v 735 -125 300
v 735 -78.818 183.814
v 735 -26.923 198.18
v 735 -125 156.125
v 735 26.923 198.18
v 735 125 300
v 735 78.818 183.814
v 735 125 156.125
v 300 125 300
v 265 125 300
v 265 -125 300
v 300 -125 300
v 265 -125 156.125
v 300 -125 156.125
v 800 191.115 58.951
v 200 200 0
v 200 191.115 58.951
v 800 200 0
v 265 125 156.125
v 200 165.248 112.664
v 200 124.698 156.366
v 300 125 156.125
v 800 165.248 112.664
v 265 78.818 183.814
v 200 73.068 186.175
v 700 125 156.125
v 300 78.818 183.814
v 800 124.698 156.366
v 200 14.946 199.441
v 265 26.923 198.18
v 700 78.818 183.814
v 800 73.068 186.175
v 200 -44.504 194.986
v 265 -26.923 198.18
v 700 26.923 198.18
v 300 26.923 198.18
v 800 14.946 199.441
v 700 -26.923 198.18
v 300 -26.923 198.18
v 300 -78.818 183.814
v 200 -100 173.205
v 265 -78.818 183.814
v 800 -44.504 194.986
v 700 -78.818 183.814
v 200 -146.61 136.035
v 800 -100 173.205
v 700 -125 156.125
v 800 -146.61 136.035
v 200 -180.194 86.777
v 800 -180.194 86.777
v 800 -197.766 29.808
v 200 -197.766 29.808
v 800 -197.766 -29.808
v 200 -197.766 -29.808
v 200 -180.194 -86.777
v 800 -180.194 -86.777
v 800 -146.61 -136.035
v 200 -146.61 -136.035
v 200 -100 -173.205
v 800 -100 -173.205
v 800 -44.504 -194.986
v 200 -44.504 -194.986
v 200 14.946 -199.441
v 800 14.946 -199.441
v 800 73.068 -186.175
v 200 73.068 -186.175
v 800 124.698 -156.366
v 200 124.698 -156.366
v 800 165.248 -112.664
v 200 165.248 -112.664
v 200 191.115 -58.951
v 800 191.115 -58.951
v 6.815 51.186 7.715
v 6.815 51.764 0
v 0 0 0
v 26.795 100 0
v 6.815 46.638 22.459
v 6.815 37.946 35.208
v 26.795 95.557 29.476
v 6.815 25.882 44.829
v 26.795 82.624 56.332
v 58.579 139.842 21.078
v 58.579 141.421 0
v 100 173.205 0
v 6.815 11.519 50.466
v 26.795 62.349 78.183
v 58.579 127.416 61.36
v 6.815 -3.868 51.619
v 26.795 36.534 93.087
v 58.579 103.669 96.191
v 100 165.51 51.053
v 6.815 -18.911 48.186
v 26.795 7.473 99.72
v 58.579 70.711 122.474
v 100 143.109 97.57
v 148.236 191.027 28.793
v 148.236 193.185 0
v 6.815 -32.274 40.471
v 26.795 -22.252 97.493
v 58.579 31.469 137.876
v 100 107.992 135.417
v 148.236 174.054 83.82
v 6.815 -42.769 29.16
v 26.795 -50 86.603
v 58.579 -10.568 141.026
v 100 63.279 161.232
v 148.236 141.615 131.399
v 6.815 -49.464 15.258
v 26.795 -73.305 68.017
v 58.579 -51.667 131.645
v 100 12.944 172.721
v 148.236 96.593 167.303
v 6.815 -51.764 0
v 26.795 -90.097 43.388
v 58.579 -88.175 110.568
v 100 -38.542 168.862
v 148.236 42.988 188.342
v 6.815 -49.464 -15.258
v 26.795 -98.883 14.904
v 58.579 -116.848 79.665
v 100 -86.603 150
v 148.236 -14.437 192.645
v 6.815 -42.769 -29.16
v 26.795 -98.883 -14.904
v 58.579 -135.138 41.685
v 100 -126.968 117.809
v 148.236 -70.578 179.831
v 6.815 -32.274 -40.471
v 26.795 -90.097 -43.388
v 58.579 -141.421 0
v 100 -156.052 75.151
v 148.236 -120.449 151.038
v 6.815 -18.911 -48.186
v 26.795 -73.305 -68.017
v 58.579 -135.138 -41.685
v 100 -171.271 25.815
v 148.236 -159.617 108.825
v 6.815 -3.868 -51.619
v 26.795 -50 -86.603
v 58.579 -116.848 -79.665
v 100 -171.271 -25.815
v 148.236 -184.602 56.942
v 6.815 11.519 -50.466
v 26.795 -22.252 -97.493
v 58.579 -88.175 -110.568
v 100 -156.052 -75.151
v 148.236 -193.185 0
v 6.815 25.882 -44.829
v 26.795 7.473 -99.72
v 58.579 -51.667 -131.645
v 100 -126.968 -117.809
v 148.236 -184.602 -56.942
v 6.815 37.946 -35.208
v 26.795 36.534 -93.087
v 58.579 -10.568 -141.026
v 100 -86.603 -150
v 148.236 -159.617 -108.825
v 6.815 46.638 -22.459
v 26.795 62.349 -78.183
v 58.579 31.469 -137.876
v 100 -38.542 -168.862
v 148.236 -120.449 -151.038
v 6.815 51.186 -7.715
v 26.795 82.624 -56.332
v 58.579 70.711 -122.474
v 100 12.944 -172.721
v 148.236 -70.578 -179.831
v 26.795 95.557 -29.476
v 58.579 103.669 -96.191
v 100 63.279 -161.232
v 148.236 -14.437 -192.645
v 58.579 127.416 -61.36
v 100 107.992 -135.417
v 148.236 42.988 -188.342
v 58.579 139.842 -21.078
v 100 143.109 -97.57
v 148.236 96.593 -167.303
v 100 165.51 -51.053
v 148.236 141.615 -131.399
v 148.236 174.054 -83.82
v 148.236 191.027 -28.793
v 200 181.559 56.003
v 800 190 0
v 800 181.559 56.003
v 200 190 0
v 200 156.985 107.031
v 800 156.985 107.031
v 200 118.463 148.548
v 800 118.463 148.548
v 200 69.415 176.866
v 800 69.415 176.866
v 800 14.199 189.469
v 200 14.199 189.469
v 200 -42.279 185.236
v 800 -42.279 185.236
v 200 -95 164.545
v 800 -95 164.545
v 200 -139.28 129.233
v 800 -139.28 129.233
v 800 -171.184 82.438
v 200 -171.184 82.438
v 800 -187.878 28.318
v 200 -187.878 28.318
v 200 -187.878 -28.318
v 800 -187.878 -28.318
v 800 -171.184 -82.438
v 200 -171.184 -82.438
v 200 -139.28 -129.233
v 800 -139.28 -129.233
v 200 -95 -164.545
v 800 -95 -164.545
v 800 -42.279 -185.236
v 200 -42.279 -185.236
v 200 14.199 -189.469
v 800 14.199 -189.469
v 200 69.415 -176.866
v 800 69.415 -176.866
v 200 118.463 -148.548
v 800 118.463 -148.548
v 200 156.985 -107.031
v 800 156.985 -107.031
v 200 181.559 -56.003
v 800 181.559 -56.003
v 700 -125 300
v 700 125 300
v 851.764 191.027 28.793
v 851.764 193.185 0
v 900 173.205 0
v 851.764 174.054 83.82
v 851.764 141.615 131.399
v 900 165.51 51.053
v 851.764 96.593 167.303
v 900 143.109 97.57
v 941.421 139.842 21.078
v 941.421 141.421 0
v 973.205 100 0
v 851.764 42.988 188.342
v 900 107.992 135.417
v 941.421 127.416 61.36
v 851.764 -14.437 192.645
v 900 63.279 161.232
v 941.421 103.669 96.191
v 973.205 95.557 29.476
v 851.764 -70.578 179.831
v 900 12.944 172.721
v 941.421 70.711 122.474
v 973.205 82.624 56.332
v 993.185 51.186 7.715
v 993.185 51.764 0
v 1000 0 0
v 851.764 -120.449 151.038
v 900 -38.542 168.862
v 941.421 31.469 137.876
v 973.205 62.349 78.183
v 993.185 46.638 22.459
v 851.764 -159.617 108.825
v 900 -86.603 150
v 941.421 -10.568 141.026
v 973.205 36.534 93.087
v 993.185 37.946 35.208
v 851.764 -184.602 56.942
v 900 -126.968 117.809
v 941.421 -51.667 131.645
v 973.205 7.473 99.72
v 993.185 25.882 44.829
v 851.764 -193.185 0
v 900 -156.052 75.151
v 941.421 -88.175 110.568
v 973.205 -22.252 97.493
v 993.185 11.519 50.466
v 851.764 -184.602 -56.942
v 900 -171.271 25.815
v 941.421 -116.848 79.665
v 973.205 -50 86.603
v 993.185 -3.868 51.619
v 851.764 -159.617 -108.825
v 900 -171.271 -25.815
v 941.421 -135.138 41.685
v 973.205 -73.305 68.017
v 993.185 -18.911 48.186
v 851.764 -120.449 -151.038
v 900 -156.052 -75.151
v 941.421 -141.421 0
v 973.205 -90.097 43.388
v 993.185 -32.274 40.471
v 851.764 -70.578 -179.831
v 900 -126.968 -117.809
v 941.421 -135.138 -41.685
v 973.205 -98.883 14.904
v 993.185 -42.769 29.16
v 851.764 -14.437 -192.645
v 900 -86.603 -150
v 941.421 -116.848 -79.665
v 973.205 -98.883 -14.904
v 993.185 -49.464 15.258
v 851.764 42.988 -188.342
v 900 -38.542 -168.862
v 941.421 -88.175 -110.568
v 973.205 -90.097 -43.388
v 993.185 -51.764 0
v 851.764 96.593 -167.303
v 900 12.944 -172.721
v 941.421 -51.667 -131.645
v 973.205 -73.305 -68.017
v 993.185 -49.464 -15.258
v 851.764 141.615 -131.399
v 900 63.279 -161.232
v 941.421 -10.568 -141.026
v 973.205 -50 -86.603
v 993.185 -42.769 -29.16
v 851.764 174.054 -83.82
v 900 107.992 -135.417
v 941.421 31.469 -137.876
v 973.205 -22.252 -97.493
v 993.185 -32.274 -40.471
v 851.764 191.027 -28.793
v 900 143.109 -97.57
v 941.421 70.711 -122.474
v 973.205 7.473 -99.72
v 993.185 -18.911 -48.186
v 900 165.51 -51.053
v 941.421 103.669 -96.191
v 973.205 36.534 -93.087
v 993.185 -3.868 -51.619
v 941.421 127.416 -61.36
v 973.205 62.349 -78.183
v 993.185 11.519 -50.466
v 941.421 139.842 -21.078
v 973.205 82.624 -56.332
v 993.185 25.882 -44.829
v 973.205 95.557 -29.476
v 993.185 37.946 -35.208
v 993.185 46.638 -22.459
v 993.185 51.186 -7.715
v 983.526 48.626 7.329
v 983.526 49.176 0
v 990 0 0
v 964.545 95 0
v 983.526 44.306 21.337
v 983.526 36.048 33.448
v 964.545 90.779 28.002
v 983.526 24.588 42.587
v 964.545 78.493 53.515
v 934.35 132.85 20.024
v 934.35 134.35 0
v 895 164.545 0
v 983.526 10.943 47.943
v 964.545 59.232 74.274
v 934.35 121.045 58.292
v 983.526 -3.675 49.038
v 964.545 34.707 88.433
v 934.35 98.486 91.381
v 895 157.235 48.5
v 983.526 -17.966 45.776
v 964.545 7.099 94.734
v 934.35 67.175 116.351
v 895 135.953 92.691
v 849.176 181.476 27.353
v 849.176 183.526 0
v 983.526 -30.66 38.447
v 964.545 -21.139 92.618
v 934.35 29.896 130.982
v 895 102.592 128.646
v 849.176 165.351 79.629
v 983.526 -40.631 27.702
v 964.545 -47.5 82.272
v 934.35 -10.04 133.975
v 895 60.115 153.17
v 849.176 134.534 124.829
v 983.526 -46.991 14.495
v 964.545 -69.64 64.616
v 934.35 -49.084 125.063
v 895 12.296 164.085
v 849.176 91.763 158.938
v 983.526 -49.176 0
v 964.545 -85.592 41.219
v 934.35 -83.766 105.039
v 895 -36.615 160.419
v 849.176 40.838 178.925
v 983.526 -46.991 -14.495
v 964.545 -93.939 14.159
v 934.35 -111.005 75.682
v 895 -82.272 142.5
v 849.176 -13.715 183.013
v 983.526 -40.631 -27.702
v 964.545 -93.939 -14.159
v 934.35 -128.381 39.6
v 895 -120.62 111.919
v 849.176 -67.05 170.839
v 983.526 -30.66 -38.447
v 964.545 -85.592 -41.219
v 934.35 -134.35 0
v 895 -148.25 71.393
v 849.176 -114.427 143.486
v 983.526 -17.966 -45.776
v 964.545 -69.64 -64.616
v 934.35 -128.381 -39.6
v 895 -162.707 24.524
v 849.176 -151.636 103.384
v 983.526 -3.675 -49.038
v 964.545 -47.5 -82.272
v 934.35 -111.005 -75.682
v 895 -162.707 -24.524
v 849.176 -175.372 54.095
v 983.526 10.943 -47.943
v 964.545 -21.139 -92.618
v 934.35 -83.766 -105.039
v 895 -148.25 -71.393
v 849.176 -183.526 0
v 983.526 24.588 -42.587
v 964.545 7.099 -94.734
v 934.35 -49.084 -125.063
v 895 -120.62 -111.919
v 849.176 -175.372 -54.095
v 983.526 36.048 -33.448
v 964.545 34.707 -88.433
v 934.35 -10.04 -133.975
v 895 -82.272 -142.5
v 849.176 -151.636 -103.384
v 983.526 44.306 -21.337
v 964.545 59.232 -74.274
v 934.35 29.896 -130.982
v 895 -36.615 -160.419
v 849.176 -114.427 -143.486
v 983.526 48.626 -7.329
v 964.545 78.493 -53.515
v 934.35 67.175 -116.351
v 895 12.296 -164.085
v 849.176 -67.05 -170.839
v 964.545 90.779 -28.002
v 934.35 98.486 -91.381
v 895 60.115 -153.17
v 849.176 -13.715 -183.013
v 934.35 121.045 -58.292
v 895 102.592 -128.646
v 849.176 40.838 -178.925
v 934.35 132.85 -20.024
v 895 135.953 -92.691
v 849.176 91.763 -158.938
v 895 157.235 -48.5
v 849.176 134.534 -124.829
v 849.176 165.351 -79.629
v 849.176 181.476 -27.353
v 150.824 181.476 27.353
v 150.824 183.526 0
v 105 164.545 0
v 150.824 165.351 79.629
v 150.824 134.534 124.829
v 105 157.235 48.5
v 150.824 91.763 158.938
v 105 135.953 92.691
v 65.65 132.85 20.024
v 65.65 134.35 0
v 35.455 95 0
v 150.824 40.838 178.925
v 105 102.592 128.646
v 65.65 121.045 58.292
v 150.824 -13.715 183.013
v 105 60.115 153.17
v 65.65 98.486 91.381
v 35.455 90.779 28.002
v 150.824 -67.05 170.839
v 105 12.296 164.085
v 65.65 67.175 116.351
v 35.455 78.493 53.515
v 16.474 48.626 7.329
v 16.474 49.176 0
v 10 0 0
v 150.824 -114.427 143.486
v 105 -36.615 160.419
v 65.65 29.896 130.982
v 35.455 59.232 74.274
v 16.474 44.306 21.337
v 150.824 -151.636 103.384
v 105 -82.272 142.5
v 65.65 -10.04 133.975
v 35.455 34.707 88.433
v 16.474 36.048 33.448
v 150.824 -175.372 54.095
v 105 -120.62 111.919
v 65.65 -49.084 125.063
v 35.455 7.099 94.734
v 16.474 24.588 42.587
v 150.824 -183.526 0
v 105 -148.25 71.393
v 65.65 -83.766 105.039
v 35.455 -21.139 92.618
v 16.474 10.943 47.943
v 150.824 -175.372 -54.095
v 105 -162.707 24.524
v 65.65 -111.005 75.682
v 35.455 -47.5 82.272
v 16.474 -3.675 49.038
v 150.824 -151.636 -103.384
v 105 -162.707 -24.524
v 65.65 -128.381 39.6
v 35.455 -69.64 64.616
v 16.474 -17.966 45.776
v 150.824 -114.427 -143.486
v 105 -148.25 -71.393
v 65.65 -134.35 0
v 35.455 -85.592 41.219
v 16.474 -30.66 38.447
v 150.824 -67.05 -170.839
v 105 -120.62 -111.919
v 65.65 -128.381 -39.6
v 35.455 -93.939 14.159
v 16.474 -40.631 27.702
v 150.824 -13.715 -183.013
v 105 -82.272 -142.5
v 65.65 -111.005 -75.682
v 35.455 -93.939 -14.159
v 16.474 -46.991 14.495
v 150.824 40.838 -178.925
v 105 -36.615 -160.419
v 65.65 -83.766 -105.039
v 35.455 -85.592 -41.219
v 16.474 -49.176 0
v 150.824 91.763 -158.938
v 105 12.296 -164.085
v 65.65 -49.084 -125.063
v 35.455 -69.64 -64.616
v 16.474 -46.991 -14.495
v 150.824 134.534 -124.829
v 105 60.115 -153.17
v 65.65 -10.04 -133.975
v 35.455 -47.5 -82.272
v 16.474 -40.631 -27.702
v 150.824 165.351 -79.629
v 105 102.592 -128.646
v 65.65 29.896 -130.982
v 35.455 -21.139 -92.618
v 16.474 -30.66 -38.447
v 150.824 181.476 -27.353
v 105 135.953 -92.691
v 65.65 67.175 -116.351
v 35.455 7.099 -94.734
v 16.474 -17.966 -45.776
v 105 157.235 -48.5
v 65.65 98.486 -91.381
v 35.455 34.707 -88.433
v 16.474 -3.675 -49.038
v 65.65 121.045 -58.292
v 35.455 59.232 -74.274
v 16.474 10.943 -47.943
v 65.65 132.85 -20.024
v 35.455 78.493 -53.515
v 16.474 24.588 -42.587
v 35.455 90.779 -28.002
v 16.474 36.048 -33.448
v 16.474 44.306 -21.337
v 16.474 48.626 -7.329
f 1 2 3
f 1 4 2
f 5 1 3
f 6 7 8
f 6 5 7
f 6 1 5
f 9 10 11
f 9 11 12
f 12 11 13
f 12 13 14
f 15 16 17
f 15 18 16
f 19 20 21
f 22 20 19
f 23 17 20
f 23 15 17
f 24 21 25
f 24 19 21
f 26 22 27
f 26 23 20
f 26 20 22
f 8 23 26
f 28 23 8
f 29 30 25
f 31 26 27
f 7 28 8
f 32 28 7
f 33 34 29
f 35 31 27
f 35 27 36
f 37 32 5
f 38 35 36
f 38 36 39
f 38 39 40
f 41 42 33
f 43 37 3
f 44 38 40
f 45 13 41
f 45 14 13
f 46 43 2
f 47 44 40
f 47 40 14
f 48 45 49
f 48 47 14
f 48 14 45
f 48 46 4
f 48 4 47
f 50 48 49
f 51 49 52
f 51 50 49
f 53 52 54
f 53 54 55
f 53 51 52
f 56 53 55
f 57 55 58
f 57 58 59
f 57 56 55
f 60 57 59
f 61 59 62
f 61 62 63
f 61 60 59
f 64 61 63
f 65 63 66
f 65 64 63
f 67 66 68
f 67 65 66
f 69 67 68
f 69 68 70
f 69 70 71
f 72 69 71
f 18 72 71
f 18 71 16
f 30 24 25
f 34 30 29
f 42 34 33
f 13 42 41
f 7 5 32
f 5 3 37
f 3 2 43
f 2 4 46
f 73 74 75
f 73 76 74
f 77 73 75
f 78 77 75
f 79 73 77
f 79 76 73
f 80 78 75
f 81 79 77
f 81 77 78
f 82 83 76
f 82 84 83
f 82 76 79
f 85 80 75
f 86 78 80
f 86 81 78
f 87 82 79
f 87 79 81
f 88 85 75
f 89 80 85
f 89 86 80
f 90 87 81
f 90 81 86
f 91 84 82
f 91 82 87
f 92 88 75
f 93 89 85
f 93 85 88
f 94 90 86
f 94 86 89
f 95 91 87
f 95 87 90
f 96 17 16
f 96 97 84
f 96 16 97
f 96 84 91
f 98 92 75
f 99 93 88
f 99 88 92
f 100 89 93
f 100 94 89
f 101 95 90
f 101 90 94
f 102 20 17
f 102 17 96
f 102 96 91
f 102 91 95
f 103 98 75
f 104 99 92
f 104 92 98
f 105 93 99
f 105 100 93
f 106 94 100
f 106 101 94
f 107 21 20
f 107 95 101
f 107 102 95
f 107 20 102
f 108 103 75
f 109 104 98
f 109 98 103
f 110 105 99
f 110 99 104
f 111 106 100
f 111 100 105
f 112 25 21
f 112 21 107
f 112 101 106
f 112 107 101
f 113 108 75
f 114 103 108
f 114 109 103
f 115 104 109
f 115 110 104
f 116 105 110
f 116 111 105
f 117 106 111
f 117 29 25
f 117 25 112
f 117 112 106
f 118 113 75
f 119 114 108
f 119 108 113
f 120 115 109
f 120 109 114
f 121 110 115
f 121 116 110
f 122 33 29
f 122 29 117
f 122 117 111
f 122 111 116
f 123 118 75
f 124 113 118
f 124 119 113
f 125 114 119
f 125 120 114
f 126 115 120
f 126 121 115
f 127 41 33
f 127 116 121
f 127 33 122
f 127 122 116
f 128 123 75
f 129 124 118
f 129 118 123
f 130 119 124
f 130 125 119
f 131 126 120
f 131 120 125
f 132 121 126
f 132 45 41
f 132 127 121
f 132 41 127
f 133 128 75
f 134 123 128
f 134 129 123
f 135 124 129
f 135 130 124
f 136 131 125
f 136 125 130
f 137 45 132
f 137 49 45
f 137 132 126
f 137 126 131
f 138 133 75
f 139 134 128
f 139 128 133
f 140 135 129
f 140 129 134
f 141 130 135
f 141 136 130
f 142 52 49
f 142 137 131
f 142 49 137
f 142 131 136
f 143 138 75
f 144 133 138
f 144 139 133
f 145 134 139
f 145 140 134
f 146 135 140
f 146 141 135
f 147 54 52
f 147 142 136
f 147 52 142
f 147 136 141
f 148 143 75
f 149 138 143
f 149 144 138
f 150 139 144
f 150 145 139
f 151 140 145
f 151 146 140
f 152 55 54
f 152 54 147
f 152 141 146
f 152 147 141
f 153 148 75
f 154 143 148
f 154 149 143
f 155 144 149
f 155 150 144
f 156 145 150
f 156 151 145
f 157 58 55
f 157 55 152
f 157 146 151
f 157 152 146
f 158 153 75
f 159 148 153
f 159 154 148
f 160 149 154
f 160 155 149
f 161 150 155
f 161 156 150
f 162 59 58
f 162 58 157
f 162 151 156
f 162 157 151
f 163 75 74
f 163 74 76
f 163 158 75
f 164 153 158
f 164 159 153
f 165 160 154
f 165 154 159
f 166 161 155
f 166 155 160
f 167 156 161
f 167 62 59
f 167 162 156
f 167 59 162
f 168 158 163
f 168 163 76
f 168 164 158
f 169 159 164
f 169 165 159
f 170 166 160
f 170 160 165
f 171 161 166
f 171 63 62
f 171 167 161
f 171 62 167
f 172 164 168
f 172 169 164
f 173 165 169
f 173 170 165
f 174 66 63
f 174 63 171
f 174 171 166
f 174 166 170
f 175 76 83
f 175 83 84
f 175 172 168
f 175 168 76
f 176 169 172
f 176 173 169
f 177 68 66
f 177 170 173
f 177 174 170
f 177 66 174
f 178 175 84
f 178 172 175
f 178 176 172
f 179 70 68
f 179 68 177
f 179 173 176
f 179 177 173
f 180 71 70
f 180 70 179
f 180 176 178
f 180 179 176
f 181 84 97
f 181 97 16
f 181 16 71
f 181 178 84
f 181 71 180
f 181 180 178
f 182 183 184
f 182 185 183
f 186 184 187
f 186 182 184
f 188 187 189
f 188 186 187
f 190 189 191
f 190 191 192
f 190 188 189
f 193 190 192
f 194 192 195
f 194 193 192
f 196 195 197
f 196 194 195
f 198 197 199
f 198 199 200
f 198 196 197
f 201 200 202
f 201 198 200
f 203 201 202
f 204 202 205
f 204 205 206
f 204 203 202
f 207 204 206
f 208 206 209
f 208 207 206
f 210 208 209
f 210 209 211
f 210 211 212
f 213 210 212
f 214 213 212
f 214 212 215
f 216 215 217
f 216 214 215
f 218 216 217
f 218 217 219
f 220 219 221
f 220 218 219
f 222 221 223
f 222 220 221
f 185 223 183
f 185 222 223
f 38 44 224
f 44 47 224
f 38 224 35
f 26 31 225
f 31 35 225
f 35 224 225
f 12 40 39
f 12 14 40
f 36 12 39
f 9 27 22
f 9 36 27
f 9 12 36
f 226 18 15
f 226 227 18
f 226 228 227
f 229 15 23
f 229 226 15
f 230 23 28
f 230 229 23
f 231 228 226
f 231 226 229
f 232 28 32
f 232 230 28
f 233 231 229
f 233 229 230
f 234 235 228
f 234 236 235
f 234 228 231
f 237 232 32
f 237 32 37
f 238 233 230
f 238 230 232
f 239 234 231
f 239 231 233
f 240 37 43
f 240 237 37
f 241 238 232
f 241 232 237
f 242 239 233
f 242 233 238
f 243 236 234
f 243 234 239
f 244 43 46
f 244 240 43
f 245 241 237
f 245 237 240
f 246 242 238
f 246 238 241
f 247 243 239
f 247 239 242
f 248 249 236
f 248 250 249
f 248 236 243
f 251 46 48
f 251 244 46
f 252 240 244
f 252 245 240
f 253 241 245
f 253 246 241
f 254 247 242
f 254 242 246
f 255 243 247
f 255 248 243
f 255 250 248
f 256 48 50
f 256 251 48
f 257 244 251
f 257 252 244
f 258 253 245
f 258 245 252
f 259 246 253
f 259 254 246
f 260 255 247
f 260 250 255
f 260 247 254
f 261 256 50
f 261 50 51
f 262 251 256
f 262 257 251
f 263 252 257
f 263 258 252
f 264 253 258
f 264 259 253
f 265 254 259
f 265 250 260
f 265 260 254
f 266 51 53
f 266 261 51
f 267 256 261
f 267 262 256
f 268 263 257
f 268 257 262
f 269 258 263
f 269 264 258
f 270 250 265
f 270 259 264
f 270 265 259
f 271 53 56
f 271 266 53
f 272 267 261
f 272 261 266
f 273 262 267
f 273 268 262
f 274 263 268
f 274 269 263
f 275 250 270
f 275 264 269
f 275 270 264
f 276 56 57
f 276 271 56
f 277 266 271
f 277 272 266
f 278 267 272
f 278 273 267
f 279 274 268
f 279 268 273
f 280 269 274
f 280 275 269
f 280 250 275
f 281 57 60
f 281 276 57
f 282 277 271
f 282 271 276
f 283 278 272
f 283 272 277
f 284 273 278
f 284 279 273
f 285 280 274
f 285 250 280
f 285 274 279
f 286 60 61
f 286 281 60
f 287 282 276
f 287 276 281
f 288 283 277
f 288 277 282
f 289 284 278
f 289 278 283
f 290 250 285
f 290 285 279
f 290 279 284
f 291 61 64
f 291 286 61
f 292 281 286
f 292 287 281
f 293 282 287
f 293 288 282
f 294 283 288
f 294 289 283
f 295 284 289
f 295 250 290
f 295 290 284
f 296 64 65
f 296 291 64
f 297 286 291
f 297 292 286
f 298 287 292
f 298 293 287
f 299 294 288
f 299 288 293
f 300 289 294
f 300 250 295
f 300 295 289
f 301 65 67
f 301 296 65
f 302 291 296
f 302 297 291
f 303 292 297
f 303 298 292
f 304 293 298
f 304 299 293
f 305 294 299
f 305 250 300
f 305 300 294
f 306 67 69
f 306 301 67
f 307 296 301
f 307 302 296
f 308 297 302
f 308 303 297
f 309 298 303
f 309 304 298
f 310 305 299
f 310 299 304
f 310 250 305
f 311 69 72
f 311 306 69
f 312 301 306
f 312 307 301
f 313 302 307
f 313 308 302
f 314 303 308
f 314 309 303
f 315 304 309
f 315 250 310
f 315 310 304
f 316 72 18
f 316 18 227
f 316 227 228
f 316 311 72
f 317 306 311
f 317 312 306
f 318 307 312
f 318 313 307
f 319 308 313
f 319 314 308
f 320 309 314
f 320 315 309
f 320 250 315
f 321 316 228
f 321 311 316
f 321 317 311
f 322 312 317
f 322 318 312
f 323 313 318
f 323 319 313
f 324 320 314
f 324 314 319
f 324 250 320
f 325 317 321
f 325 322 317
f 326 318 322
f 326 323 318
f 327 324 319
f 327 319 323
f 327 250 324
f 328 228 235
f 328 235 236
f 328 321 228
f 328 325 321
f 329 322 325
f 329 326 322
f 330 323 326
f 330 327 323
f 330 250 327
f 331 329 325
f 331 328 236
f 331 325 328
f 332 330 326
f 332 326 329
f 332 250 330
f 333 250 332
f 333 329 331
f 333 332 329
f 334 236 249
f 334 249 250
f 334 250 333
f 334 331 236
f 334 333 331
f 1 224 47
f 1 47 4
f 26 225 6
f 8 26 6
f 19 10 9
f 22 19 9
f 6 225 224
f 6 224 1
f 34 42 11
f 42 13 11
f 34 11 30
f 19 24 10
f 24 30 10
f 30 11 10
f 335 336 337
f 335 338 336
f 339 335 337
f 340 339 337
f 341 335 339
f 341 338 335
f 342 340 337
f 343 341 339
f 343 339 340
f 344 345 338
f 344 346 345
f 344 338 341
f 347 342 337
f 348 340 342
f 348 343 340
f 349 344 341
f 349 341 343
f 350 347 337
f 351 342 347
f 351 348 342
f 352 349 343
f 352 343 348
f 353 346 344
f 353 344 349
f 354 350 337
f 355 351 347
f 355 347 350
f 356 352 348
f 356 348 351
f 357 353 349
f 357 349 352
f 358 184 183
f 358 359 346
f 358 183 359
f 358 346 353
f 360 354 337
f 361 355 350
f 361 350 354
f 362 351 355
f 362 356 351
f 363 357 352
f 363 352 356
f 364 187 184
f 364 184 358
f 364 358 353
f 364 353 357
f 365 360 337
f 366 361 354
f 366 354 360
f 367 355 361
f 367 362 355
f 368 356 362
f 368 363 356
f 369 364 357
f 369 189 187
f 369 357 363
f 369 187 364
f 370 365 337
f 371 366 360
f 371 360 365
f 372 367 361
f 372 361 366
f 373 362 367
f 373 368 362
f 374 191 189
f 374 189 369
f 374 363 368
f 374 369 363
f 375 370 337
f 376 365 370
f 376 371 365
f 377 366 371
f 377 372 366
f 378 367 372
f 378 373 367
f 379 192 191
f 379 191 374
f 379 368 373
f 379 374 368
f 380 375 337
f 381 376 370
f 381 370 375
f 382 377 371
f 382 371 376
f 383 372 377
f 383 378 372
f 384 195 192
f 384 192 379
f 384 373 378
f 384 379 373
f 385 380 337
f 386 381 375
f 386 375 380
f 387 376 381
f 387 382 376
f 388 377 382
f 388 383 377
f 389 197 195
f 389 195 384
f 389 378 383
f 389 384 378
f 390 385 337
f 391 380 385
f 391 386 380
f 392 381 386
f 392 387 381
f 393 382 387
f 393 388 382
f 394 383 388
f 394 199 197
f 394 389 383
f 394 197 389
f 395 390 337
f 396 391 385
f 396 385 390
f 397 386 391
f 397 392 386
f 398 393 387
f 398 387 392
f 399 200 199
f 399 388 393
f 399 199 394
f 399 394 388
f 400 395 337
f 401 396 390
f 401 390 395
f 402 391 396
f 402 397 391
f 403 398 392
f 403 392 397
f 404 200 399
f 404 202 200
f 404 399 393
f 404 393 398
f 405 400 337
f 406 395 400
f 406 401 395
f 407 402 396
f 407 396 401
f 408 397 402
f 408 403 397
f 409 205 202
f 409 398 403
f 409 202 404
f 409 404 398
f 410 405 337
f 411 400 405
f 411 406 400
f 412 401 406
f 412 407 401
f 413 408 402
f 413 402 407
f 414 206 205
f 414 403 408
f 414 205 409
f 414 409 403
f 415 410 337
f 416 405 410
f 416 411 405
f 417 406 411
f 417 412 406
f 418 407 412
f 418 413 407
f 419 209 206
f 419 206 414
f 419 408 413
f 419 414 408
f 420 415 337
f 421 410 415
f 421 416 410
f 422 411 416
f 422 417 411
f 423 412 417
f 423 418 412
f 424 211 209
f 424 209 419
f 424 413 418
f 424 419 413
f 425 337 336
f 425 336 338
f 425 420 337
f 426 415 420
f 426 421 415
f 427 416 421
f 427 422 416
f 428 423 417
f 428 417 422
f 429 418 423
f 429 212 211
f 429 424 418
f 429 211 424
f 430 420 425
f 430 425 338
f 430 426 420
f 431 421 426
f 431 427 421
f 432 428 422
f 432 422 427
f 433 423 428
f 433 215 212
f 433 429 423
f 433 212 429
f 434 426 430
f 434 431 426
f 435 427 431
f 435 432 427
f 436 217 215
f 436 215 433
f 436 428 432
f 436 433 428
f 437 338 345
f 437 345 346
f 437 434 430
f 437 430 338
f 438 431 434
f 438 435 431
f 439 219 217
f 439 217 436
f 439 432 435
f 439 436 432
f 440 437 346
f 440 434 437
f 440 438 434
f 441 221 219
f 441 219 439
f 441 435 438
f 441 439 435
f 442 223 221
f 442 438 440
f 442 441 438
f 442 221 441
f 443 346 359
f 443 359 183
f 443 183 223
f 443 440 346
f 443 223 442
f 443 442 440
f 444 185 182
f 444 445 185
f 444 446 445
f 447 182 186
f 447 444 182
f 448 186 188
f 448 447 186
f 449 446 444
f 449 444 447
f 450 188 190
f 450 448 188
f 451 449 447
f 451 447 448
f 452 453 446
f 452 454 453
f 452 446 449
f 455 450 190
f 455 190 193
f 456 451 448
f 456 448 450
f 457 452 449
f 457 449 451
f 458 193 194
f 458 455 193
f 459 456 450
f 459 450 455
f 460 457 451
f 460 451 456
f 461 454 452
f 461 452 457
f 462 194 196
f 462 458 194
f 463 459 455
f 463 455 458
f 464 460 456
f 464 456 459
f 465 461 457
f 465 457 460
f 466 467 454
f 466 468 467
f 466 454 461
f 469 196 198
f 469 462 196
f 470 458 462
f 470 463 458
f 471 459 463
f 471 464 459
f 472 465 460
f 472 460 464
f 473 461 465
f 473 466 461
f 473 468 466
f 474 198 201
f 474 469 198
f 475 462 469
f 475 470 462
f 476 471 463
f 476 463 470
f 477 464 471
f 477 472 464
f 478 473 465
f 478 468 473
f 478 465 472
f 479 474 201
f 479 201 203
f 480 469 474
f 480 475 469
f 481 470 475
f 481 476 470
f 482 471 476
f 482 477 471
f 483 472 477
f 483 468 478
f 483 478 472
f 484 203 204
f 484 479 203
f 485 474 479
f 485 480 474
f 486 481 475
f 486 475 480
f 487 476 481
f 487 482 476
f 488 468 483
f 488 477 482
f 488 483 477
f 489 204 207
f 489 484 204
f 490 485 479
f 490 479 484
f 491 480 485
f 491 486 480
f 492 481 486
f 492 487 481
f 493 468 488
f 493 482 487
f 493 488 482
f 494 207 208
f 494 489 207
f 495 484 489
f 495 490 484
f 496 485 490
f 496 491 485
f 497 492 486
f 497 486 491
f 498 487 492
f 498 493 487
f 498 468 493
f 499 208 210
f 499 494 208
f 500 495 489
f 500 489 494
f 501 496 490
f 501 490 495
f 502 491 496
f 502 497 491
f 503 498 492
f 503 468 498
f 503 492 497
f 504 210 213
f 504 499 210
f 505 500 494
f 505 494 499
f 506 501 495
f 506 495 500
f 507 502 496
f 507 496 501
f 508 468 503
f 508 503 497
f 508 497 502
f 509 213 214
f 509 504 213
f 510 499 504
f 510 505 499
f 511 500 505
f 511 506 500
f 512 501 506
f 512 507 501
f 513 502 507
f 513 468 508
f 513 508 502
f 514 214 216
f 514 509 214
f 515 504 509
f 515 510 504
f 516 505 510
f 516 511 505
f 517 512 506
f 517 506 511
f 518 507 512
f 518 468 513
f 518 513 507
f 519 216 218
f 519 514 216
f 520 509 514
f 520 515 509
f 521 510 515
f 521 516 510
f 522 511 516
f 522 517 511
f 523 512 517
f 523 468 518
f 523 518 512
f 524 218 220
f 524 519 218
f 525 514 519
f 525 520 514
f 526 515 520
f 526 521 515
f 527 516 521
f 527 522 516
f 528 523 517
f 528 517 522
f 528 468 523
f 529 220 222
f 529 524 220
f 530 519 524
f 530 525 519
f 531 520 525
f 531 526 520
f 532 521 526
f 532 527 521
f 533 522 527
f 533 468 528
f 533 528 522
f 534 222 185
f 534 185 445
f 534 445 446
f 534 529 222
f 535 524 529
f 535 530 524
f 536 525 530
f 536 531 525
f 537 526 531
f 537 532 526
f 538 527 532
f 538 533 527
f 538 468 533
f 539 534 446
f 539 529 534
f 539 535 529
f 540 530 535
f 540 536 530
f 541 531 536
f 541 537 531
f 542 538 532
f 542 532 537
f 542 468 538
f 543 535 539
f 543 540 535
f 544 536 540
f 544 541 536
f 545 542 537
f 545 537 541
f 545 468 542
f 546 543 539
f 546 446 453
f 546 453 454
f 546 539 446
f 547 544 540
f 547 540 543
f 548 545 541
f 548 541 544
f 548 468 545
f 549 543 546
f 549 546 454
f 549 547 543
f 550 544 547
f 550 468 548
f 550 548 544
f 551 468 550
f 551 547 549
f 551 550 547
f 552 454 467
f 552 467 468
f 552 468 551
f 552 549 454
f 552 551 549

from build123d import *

# Parameters (mm, degrees)
P_IDAT_VYSUNUT_M2_REACH = 502
SKICA2_W                = 35
SKICA2_H                = 250


with BuildPart() as part:
    # Skica1 → Rotovat1 (revolve)
    with BuildSketch(Plane.XY):
        with BuildLine():
            Line((200, 200), (800, 200))
            ThreePointArc((800, 200), (941.421356237, 141.421356237), (1000, 0))
            Line((1000, 0), (990, 0))
            ThreePointArc((990, 0), (934.350288425, 134.350288425), (800, 190))
            Line((800, 190), (200, 190))
            ThreePointArc((200, 190), (65.649711575, 134.350288425), (10, 0))
            Line((10, 0), (0, 0))
            ThreePointArc((0, 0), (58.578643763, 141.421356237), (200, 200))
        make_face()
    revolve(axis=Axis((0, 0, 0), (1, 0, 0)))

    # Skica2 → Přidat vysunutím2 (add, up to next)
    with BuildSketch(Plane.XY.offset(300), mode=Mode.PRIVATE) as p_idat_vysunut_m2_sk1:
        with Locations((717.5, 0)):
            Rectangle(SKICA2_W, SKICA2_H)
    p_idat_vysunut_m2_tool1 = extrude(p_idat_vysunut_m2_sk1.sketch, amount=-P_IDAT_VYSUNUT_M2_REACH, mode=Mode.PRIVATE) - part.part
    add(p_idat_vysunut_m2_tool1.solids().sort_by_distance((717.5, 0, 300))[0])
    # Skica2 → Přidat vysunutím2 (add, up to next)
    with BuildSketch(Plane.XY.offset(300), mode=Mode.PRIVATE) as p_idat_vysunut_m2_sk2:
        with Locations((282.5, 0)):
            Rectangle(SKICA2_W, SKICA2_H)
    p_idat_vysunut_m2_tool2 = extrude(p_idat_vysunut_m2_sk2.sketch, amount=-P_IDAT_VYSUNUT_M2_REACH, mode=Mode.PRIVATE) - part.part
    add(p_idat_vysunut_m2_tool2.solids().sort_by_distance((282.5, 0, 300))[0])


solid = part.part
